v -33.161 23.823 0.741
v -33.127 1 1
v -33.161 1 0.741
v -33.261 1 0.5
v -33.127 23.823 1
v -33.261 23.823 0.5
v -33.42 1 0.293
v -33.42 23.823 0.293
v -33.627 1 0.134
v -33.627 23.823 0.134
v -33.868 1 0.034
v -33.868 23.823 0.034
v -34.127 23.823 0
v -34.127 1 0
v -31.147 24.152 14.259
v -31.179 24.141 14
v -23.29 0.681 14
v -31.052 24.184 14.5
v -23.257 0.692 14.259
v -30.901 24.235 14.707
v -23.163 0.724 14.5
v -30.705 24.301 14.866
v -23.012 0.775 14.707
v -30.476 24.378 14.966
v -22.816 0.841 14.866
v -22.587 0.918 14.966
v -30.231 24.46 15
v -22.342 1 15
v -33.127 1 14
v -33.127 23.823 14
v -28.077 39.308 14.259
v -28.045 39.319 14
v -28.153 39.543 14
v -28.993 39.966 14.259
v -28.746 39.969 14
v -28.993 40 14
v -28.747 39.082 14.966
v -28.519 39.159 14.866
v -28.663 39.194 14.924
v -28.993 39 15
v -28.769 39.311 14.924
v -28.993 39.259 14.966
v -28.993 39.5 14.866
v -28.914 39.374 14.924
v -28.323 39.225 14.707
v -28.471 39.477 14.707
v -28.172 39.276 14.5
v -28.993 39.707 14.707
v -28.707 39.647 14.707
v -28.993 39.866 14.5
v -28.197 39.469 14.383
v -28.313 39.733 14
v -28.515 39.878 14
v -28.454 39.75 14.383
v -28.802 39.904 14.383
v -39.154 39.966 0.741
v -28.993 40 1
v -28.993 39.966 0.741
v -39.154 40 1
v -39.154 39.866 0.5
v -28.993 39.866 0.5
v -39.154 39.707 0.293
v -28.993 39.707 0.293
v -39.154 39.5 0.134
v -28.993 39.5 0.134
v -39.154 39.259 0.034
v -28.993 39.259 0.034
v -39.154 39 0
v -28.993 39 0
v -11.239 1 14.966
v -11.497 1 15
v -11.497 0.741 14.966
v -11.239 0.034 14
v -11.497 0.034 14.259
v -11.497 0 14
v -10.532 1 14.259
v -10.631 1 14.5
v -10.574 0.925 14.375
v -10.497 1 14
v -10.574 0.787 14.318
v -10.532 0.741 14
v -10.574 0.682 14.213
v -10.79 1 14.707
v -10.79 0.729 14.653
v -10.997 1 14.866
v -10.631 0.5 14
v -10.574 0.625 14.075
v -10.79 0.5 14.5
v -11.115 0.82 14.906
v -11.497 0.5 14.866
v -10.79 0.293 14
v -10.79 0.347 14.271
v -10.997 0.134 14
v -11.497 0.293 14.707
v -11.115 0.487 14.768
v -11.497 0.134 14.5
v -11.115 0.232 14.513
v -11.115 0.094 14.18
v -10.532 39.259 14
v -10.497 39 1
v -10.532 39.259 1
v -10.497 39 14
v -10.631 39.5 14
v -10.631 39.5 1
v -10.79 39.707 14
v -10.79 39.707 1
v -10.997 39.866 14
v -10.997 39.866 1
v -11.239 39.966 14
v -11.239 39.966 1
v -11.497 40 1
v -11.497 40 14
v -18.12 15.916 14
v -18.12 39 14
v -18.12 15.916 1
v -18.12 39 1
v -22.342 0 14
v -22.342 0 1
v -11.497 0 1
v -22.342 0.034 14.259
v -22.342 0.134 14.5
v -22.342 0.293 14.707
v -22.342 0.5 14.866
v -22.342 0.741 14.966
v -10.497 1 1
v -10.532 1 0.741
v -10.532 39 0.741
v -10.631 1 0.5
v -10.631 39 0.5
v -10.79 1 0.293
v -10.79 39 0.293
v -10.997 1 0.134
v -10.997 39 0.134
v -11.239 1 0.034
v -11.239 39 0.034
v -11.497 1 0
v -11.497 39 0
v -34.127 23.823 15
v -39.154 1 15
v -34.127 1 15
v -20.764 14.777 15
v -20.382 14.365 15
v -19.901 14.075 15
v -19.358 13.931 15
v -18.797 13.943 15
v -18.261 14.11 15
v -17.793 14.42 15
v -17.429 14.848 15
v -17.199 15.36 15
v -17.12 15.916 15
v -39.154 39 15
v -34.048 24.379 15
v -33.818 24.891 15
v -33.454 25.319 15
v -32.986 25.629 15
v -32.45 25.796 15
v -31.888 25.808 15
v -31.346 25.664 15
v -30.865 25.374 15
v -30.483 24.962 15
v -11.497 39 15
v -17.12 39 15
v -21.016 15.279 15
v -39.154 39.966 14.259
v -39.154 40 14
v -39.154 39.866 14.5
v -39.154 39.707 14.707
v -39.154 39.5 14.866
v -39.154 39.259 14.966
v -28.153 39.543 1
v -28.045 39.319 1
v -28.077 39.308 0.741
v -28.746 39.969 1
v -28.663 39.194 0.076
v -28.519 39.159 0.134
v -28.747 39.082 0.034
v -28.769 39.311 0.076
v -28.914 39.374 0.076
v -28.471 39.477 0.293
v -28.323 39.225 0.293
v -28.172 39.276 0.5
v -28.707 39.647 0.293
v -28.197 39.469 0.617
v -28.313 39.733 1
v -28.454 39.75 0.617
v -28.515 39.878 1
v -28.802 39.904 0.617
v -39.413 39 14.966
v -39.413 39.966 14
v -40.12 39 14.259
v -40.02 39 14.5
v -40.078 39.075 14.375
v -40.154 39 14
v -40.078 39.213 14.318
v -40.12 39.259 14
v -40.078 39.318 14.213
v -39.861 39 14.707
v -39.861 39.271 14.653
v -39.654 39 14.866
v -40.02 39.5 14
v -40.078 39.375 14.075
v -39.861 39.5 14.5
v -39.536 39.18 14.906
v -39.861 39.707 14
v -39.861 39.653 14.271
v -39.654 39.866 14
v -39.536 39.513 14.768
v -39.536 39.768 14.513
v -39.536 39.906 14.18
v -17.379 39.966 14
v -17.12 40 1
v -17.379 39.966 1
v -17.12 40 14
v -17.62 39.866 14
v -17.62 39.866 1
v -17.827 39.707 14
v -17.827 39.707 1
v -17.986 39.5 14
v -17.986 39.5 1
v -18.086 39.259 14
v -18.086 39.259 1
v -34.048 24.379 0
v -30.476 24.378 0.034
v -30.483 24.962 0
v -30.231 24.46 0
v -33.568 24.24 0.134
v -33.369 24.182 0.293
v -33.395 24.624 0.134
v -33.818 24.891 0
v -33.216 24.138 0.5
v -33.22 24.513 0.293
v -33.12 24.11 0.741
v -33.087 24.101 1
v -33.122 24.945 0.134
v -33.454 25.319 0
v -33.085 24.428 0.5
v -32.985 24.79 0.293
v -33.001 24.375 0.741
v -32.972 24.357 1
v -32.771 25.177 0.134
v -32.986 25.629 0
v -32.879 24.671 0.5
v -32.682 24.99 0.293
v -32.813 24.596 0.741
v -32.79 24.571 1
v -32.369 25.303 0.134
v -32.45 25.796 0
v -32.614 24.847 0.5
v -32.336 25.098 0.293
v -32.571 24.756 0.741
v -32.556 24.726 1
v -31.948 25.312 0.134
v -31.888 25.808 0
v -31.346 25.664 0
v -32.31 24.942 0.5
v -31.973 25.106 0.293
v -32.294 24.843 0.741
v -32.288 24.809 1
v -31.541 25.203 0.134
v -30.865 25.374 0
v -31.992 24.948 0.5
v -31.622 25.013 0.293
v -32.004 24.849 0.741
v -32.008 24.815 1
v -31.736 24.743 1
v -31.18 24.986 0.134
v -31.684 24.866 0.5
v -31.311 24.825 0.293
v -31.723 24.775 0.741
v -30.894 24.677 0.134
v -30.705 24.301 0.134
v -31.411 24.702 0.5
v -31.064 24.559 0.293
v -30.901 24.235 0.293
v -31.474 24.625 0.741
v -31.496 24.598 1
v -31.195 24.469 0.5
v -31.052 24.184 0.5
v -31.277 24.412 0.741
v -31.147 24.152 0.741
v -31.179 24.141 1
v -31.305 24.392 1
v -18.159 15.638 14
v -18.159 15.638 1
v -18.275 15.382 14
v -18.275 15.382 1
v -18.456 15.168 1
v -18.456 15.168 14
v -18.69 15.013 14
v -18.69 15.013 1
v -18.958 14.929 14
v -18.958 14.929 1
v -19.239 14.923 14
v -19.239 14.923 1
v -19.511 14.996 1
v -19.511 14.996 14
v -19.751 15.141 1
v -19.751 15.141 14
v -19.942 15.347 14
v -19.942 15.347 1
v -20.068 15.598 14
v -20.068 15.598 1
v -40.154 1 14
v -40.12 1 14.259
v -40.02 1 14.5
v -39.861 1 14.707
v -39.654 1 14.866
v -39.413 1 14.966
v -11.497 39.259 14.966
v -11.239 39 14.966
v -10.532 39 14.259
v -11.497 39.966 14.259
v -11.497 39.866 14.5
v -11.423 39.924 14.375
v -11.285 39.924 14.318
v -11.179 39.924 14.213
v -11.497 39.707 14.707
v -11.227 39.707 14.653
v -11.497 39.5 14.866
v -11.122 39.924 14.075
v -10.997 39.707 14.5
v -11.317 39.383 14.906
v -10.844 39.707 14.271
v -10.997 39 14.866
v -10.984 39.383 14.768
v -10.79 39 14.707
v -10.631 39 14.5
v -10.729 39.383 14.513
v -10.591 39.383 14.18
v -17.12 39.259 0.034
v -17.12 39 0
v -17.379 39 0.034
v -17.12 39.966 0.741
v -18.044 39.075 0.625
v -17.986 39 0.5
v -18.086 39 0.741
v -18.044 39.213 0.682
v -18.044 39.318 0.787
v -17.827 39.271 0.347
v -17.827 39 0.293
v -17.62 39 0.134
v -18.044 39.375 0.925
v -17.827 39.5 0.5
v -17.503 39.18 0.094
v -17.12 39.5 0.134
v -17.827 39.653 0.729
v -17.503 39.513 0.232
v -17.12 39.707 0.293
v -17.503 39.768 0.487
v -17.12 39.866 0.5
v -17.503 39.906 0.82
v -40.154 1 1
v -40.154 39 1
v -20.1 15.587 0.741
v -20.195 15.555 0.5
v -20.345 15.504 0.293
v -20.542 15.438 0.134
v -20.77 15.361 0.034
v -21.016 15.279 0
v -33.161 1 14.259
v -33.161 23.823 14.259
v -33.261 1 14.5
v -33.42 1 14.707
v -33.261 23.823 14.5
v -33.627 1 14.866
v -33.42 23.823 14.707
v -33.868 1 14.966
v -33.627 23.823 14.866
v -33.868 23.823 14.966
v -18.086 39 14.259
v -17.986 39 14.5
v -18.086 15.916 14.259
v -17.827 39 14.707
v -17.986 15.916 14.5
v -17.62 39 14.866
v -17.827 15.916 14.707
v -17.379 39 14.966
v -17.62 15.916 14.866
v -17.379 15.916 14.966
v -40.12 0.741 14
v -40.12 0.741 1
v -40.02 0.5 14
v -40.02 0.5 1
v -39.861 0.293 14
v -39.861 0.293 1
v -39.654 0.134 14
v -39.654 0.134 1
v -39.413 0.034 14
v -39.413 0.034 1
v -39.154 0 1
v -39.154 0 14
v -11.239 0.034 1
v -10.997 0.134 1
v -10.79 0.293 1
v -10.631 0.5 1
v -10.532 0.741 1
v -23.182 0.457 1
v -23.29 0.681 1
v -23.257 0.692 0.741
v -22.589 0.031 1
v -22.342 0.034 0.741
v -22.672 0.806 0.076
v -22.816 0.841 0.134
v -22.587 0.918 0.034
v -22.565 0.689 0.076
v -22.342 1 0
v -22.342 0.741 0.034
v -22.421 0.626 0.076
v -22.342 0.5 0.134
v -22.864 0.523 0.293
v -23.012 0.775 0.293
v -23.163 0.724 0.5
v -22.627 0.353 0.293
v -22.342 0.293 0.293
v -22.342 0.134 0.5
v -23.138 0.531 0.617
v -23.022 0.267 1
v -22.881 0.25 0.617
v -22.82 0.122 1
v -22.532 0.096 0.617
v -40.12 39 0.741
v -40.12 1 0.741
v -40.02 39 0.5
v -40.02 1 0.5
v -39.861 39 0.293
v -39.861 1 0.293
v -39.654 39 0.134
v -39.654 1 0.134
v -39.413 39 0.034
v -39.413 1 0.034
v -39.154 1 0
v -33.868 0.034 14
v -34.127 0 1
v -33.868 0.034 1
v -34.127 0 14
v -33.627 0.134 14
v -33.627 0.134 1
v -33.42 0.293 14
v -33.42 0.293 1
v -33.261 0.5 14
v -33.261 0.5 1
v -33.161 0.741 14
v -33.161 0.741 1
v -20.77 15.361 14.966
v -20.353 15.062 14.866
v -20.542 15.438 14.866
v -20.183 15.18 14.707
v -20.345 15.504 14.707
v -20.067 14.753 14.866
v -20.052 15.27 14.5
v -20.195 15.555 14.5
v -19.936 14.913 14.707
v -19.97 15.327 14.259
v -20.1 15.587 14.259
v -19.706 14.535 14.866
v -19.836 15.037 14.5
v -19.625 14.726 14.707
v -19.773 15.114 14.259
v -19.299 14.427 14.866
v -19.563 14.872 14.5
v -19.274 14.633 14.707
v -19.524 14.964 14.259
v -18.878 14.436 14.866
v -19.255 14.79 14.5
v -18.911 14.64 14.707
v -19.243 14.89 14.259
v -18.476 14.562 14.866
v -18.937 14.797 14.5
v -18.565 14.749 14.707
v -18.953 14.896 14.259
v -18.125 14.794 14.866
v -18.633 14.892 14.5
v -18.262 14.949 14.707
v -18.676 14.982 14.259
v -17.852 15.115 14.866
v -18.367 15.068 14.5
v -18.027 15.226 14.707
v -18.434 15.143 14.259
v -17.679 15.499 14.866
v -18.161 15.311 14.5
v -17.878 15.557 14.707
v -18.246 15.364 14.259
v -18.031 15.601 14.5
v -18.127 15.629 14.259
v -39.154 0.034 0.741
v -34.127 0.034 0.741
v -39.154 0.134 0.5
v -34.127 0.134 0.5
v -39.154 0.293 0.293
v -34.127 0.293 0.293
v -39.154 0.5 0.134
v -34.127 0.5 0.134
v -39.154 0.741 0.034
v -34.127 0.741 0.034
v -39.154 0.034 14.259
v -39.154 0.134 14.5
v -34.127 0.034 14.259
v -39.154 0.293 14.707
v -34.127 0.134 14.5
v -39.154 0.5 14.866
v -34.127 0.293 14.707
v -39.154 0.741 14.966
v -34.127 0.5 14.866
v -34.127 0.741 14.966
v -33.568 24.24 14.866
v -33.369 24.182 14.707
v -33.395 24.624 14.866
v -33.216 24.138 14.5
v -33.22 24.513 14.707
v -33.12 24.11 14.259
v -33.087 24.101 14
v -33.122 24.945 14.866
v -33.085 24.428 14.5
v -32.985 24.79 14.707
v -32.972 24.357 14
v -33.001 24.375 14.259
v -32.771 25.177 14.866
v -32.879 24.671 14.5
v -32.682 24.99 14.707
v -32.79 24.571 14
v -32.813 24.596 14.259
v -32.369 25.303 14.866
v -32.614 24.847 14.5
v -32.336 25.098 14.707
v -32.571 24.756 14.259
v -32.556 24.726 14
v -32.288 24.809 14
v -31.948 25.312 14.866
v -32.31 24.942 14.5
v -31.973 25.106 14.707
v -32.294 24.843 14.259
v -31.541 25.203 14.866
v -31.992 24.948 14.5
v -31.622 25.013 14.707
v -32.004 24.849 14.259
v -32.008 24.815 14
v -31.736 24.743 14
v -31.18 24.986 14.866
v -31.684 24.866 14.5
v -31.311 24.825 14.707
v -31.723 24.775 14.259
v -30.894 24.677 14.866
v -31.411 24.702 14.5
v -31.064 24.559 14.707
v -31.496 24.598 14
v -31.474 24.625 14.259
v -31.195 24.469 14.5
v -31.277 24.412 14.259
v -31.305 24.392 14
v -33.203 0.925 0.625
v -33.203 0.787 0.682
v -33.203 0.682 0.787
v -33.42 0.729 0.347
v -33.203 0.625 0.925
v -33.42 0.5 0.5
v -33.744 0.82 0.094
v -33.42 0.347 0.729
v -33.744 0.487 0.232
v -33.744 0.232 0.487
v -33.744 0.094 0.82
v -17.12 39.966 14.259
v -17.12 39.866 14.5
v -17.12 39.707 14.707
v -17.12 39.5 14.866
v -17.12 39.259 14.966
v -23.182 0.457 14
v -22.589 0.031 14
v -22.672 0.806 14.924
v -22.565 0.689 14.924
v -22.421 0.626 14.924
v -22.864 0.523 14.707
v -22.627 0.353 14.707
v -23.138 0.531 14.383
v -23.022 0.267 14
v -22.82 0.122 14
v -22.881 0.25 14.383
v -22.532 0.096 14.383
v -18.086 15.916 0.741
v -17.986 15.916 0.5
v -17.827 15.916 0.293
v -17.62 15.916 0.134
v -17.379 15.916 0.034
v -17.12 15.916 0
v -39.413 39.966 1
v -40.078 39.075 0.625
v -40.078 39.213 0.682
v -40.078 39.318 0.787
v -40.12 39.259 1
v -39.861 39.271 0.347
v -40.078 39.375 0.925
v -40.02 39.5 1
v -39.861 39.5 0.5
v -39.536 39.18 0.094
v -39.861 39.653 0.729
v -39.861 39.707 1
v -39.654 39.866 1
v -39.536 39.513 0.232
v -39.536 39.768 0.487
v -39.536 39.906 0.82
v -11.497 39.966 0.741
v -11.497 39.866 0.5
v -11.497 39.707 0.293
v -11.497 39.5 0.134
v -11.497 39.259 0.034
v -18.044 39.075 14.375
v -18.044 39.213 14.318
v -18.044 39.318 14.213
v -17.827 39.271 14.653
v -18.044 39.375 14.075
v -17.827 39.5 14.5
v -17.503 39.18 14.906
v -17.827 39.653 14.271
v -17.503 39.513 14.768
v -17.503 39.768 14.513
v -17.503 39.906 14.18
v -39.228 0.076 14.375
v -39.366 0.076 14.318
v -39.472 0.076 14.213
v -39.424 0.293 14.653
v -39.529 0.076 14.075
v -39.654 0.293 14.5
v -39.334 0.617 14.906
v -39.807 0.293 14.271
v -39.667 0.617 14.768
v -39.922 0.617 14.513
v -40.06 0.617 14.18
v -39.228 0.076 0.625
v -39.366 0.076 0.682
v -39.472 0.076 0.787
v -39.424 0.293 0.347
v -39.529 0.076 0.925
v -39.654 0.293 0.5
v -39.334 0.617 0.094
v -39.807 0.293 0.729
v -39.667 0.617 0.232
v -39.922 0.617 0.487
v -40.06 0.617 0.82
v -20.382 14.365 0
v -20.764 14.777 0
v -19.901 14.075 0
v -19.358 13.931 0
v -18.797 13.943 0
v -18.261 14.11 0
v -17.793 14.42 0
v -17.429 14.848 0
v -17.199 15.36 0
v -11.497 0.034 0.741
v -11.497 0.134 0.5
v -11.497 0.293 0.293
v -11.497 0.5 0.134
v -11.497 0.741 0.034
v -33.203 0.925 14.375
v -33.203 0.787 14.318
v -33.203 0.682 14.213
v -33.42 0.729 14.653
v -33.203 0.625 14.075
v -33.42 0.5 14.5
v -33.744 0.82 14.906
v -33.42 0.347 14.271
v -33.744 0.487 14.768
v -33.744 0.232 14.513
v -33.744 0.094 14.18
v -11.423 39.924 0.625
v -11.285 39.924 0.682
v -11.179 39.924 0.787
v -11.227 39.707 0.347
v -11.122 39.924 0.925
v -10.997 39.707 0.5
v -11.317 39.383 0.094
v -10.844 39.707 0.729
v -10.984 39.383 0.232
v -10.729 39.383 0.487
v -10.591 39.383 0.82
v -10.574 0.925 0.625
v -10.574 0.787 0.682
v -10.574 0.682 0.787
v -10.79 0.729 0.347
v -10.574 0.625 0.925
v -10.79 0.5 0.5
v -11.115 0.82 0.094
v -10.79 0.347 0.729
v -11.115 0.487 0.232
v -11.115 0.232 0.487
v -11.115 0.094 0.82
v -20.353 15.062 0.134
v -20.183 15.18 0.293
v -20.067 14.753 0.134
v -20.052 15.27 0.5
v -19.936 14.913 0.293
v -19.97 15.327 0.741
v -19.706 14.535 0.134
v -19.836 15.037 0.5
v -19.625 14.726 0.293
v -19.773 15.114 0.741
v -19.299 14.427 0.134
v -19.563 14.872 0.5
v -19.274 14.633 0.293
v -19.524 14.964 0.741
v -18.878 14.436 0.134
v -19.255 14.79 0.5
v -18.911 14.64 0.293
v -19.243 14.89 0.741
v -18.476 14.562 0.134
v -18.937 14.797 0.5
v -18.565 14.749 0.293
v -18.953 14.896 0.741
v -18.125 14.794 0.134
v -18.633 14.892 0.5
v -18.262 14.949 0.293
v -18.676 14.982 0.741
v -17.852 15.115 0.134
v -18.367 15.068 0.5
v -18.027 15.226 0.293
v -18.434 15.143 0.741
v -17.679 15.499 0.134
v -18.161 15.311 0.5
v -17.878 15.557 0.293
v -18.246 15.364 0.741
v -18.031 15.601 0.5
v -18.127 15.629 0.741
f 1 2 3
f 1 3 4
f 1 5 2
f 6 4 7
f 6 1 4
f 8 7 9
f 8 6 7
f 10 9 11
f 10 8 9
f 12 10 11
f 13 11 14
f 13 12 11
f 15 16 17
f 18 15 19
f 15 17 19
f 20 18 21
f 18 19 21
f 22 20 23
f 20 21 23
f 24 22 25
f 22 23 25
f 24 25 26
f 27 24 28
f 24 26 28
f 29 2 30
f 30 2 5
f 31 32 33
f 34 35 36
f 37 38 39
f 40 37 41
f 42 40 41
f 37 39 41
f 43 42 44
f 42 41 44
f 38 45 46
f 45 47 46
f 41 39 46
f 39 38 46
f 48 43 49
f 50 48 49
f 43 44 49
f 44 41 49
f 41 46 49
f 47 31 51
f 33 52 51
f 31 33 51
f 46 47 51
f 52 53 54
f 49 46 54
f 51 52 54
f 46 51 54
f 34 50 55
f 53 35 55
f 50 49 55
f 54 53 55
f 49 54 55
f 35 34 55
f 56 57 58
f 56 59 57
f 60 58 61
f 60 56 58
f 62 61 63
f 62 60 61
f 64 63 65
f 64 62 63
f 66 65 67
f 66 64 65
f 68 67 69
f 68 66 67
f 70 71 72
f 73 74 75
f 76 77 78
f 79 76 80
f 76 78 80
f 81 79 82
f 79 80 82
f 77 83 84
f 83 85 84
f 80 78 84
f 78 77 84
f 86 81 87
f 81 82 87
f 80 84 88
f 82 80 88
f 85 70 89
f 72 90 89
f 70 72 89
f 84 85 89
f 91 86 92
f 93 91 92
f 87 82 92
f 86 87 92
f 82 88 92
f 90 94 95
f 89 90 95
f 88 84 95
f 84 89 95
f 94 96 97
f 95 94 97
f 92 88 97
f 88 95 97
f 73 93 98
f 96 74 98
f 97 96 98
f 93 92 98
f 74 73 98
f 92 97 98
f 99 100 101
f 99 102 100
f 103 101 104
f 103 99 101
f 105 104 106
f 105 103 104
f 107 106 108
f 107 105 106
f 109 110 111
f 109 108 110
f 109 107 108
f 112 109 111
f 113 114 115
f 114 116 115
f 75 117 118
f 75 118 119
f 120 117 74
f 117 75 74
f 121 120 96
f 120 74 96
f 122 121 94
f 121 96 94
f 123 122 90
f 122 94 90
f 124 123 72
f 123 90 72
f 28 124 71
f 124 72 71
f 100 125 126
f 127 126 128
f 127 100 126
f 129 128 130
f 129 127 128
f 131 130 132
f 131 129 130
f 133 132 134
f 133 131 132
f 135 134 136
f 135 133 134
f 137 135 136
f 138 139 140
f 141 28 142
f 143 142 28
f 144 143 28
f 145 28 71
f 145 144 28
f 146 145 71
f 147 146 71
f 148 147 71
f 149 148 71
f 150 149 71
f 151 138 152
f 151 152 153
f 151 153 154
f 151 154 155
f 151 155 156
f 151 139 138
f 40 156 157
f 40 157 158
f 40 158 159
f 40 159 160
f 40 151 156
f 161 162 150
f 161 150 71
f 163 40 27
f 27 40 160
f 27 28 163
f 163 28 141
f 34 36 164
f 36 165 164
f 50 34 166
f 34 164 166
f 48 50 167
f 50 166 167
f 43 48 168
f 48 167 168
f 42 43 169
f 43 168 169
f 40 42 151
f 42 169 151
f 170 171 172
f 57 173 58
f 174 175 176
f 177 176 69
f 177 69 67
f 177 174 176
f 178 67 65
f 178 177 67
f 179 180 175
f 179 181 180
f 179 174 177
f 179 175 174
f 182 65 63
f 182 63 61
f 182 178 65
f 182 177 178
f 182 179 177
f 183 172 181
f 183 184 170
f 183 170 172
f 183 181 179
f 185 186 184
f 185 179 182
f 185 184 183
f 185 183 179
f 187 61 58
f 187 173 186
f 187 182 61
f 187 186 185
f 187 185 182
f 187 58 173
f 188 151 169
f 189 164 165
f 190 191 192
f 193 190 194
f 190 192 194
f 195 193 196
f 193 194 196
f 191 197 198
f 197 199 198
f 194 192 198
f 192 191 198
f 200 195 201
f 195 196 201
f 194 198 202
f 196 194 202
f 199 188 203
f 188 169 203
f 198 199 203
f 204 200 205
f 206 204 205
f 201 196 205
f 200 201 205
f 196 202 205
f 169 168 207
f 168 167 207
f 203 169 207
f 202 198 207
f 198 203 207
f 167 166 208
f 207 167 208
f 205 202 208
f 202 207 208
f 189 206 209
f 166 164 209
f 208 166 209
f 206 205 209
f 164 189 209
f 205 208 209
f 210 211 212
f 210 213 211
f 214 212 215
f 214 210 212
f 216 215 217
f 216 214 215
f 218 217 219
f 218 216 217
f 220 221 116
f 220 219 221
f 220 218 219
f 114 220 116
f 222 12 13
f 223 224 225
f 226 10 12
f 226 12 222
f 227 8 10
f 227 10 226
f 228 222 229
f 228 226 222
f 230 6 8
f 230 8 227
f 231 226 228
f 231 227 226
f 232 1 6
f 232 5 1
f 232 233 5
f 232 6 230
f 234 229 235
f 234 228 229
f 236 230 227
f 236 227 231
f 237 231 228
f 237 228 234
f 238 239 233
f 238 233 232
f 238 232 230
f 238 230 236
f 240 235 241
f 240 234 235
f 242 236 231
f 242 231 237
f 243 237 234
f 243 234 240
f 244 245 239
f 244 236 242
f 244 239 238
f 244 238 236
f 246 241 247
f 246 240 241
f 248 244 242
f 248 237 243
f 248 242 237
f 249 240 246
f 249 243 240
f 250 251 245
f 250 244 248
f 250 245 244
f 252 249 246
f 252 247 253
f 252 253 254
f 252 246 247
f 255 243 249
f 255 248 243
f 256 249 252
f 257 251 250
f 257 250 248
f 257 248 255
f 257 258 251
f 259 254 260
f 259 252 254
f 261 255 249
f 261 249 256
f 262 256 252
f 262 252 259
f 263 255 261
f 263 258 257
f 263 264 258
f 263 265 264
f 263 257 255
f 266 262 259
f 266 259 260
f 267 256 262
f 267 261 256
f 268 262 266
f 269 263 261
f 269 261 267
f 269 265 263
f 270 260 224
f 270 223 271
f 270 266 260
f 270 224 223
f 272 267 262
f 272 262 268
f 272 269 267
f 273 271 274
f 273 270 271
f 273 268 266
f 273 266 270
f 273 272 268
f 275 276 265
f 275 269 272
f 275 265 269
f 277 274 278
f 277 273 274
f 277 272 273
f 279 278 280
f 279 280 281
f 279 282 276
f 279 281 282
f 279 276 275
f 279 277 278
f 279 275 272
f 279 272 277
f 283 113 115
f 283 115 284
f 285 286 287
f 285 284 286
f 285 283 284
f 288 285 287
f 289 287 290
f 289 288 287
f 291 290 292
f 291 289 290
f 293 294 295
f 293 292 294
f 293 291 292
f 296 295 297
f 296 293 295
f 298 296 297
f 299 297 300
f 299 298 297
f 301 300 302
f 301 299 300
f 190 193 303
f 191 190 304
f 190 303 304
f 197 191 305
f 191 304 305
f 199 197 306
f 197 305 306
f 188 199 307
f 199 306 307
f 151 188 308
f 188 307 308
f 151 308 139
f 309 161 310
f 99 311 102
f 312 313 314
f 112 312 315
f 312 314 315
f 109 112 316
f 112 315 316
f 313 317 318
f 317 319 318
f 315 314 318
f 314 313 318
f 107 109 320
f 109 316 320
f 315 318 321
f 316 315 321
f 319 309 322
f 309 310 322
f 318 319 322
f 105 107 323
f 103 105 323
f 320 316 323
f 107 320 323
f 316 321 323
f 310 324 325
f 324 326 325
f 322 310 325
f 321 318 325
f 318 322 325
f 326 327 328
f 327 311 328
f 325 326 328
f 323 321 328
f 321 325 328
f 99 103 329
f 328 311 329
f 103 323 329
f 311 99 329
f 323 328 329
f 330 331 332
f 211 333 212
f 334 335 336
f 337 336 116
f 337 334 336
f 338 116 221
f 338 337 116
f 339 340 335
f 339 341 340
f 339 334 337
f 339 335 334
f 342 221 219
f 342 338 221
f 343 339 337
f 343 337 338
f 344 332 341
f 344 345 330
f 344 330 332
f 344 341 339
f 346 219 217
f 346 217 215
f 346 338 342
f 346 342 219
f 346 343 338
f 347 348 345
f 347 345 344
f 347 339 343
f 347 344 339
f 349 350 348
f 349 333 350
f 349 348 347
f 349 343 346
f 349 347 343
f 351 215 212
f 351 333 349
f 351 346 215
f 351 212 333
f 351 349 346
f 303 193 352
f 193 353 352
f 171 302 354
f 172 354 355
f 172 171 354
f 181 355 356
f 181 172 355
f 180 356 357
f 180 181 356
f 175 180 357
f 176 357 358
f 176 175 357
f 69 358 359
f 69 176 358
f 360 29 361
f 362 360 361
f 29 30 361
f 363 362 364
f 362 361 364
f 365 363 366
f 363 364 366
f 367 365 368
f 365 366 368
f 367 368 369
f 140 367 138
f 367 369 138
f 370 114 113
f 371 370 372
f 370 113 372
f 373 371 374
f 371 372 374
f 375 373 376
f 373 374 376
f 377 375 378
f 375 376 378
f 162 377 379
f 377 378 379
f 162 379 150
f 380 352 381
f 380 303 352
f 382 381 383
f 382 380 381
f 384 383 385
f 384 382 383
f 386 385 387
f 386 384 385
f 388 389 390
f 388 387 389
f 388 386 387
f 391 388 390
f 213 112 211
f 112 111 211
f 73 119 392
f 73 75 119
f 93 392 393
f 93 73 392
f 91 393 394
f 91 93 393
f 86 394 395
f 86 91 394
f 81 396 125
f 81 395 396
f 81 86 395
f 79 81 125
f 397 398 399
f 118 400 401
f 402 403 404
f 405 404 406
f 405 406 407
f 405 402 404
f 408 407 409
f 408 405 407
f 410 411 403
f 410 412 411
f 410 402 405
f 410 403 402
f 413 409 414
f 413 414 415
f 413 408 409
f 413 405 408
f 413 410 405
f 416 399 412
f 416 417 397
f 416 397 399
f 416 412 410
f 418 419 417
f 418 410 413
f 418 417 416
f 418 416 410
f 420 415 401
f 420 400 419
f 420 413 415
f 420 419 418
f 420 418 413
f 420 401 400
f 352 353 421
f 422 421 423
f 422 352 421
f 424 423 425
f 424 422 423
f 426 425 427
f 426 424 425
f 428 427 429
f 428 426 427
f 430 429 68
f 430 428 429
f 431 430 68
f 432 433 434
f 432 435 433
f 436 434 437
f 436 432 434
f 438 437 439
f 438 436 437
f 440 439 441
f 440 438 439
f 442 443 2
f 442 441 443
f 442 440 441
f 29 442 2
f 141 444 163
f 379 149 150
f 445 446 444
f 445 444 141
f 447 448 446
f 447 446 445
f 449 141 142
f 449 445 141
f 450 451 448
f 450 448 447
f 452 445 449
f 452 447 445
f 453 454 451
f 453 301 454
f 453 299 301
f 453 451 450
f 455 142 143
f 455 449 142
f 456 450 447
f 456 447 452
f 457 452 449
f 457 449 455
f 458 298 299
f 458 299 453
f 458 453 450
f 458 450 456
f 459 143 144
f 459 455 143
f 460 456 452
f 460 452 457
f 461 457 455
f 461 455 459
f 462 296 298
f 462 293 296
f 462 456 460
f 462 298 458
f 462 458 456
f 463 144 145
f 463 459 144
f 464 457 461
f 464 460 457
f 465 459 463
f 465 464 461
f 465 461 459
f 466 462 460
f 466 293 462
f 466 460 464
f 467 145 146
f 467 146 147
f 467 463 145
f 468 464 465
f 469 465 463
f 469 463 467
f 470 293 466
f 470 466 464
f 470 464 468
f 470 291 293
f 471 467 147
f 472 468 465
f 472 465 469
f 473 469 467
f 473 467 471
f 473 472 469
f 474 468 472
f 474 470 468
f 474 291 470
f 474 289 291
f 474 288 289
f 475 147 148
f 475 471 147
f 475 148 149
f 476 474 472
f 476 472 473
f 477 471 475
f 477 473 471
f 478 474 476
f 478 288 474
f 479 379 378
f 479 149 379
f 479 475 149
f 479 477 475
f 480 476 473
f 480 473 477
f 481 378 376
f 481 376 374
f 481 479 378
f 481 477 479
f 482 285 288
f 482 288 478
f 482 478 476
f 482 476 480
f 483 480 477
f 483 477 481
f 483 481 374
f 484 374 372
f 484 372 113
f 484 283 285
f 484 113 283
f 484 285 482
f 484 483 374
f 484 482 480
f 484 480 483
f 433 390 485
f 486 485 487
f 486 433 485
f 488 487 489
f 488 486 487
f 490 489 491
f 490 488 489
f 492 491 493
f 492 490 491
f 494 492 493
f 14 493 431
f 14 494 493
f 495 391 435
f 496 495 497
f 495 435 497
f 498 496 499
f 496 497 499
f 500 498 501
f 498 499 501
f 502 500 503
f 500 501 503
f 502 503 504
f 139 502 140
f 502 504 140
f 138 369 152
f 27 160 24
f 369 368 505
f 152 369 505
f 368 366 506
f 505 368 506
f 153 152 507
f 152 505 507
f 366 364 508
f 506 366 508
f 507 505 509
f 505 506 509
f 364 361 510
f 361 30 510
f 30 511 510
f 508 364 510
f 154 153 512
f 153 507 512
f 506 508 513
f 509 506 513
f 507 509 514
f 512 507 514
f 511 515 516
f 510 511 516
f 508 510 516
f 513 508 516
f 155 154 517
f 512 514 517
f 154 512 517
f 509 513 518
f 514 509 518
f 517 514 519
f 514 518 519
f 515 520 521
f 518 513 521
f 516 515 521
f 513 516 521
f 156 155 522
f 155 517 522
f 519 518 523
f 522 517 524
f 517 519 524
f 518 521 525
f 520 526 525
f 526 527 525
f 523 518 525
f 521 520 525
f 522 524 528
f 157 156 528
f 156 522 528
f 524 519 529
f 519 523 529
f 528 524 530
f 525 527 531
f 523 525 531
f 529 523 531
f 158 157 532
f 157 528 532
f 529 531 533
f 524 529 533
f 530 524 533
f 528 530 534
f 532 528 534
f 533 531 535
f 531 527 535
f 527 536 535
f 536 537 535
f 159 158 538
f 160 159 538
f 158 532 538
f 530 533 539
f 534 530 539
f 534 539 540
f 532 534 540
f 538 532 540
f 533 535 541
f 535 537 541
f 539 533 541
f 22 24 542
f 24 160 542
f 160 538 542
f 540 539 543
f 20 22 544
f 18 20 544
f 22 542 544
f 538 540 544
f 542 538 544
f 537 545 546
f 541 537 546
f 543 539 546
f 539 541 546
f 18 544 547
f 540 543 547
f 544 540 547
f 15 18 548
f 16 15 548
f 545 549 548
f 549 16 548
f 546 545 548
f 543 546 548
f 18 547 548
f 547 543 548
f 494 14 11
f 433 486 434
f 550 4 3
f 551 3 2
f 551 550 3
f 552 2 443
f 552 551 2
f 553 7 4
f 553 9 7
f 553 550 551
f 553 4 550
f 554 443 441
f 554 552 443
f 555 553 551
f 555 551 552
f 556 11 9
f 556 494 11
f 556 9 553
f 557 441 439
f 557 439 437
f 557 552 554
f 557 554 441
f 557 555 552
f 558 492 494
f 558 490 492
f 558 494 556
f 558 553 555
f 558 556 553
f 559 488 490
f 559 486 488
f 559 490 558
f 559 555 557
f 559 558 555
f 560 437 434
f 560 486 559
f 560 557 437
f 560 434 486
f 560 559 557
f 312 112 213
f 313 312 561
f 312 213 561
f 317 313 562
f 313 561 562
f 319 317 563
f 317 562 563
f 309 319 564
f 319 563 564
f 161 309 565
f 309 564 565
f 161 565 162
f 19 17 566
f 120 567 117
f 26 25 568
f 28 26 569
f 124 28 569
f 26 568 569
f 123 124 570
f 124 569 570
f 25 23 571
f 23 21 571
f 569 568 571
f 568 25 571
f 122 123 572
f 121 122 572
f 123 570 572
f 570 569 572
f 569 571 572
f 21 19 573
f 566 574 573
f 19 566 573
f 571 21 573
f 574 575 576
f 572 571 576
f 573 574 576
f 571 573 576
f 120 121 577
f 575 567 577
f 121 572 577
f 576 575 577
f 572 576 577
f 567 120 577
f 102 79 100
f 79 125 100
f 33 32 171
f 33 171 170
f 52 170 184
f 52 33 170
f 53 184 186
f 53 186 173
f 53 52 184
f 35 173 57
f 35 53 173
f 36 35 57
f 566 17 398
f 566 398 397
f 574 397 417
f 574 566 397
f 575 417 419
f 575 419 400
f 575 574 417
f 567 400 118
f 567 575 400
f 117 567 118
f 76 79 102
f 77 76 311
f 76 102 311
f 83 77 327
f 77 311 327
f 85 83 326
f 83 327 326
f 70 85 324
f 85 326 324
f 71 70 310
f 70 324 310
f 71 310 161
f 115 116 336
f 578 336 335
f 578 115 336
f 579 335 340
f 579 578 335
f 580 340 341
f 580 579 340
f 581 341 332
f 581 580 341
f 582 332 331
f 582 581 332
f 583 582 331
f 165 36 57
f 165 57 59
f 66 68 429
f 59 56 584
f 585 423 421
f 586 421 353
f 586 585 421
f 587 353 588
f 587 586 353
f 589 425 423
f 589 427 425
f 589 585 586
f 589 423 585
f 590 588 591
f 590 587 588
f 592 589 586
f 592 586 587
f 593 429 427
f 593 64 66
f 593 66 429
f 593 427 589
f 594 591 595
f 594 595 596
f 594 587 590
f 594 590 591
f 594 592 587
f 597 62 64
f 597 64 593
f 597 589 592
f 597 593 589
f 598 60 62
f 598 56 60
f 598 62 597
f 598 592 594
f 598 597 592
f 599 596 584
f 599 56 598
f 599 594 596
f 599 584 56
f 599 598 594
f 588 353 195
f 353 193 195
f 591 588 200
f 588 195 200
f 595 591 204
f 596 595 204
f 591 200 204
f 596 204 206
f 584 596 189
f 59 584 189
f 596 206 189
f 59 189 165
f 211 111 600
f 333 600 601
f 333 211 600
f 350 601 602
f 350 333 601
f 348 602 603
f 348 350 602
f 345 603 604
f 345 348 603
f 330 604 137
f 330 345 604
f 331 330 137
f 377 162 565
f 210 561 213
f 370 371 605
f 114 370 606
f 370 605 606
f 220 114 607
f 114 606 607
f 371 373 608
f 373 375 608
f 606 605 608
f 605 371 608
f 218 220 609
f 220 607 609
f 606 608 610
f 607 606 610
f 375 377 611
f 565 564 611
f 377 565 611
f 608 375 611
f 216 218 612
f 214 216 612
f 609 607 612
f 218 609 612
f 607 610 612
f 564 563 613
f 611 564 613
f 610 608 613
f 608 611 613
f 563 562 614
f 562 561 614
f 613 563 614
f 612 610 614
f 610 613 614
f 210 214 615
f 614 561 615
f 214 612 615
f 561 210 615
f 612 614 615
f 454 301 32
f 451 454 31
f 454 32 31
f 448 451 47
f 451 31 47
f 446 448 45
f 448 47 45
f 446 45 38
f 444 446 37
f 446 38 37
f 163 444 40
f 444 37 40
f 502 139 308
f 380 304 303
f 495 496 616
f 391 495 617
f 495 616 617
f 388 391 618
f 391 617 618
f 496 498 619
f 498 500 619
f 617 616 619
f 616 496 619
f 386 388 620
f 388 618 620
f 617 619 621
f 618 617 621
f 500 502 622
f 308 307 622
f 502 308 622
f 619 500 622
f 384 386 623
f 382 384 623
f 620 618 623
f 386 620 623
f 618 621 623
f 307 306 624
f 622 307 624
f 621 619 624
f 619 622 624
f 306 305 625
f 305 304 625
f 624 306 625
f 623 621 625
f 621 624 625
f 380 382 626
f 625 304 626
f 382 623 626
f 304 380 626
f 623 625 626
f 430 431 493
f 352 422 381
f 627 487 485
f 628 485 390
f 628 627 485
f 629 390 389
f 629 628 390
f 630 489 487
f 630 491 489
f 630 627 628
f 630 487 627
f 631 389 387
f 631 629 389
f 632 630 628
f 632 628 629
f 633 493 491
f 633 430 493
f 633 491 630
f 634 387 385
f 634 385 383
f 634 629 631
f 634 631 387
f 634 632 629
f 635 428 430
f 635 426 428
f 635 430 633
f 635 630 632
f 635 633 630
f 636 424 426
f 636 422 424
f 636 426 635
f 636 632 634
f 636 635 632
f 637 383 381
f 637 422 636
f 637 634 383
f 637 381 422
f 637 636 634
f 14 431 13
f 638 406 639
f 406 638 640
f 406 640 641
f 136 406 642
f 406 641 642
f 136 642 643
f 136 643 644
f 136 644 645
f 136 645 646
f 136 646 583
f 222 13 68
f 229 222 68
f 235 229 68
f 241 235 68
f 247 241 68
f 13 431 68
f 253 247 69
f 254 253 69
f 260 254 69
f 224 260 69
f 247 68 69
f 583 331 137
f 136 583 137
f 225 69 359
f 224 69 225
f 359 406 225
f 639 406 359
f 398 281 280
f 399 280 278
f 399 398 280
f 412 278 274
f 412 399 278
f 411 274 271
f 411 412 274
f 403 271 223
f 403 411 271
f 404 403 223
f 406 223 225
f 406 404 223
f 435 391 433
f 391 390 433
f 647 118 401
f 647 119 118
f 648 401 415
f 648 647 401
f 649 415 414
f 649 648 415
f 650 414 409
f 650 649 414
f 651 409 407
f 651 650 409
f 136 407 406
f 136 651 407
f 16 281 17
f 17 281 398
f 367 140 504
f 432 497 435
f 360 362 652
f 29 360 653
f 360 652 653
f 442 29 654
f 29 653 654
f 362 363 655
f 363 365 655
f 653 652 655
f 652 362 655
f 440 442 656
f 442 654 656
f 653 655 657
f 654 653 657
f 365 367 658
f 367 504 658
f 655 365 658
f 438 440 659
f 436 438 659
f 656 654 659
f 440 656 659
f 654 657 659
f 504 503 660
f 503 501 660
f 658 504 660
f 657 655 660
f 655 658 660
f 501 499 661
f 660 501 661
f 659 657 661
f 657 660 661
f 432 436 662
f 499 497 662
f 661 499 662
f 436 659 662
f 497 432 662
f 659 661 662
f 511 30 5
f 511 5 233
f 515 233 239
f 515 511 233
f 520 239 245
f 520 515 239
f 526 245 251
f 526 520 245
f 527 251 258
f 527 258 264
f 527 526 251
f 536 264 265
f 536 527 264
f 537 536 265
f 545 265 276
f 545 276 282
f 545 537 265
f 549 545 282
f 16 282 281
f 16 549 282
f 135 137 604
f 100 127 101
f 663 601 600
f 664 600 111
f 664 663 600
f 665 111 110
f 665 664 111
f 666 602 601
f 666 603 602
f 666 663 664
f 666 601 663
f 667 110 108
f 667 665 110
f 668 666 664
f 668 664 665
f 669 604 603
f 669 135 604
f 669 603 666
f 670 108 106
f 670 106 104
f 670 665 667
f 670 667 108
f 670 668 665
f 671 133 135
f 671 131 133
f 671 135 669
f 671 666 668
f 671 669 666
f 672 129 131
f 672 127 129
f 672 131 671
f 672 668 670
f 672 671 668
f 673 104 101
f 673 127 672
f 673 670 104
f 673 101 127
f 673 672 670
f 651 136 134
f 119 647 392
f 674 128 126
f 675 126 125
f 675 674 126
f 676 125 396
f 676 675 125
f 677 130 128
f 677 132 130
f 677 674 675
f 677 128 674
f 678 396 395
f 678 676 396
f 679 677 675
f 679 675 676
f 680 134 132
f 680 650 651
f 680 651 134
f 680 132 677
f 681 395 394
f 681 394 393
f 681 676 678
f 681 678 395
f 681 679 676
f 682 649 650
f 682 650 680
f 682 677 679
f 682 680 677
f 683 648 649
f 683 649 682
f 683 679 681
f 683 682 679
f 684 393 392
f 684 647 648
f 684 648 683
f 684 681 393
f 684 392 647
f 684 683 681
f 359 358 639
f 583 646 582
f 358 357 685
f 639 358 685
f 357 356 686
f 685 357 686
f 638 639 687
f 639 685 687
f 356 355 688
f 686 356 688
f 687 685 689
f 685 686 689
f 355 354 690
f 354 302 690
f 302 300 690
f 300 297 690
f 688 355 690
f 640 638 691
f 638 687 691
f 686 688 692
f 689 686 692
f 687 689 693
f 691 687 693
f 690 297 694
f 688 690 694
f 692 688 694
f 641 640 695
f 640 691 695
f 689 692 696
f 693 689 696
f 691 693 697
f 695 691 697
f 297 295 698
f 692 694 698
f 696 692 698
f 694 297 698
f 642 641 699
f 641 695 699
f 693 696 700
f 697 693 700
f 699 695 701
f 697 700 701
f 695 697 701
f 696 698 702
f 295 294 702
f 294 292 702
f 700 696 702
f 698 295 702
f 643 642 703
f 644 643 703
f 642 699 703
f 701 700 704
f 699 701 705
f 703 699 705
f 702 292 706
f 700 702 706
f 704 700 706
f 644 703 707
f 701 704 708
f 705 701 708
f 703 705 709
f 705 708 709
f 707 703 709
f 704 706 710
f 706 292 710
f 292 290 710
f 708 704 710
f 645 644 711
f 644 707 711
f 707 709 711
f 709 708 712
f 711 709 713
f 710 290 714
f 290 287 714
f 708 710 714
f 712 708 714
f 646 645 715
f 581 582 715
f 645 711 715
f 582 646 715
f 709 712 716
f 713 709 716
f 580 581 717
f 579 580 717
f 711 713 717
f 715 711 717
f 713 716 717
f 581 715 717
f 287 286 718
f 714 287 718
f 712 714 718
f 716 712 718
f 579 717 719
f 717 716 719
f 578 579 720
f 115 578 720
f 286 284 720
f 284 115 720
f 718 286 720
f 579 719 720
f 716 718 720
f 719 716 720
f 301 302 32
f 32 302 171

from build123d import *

# Parameters (mm, degrees)
F1_DEPTH = 15
F2_R     = 1


with BuildPart() as f1:
    # F0 (on Top) → F1 (new body)
    with BuildSketch(Plane.XY):
        Polygon((-40.153805, 40), (-40.153805, 0), (-33.126801, 0), (-33.126801, 29.933507), (-23.060559, 0), (-10.49746, 0), (-10.49746, 40), (-18.119976, 40), (-18.119976, 9.805305), (-28.274053, 40), align=None)
    extrude(amount=F1_DEPTH)

    # F2
    f2_edges = [f1.edges().sort_by_distance(p)[0] for p in [
        (-23.197014, 24.902652, 15),
        (-34.213929, 40, 15),
        (-40.153805, 20, 15),
        (-36.640303, 0, 15),
        (-33.126801, 14.966753, 15),
        (-28.09368, 14.966753, 15),
        (-16.779009, 0, 15),
        (-10.49746, 20, 15),
        (-14.308718, 40, 15),
        (-18.119976, 24.902652, 15),
        (-23.197014, 24.902652, 0),
        (-34.213929, 40, 0),
        (-40.153805, 20, 0),
        (-36.640303, 0, 0),
        (-33.126801, 14.966753, 0),
        (-28.09368, 14.966753, 0),
        (-16.779009, 0, 0),
        (-10.49746, 20, 0),
        (-14.308718, 40, 0),
        (-18.119976, 24.902652, 0),
        (-23.060559, 0, 7.5),
        (-10.49746, 0, 7.5),
        (-40.153805, 0, 7.5),
        (-33.126801, 0, 7.5),
        (-28.274053, 40, 7.5),
        (-40.153805, 40, 7.5),
        (-10.49746, 40, 7.5),
        (-18.119976, 40, 7.5),
        (-33.126801, 29.933507, 7.5),
        (-18.119976, 9.805305, 7.5),
    ]]
    fillet(f2_edges, radius=F2_R)


solid = f1.part
